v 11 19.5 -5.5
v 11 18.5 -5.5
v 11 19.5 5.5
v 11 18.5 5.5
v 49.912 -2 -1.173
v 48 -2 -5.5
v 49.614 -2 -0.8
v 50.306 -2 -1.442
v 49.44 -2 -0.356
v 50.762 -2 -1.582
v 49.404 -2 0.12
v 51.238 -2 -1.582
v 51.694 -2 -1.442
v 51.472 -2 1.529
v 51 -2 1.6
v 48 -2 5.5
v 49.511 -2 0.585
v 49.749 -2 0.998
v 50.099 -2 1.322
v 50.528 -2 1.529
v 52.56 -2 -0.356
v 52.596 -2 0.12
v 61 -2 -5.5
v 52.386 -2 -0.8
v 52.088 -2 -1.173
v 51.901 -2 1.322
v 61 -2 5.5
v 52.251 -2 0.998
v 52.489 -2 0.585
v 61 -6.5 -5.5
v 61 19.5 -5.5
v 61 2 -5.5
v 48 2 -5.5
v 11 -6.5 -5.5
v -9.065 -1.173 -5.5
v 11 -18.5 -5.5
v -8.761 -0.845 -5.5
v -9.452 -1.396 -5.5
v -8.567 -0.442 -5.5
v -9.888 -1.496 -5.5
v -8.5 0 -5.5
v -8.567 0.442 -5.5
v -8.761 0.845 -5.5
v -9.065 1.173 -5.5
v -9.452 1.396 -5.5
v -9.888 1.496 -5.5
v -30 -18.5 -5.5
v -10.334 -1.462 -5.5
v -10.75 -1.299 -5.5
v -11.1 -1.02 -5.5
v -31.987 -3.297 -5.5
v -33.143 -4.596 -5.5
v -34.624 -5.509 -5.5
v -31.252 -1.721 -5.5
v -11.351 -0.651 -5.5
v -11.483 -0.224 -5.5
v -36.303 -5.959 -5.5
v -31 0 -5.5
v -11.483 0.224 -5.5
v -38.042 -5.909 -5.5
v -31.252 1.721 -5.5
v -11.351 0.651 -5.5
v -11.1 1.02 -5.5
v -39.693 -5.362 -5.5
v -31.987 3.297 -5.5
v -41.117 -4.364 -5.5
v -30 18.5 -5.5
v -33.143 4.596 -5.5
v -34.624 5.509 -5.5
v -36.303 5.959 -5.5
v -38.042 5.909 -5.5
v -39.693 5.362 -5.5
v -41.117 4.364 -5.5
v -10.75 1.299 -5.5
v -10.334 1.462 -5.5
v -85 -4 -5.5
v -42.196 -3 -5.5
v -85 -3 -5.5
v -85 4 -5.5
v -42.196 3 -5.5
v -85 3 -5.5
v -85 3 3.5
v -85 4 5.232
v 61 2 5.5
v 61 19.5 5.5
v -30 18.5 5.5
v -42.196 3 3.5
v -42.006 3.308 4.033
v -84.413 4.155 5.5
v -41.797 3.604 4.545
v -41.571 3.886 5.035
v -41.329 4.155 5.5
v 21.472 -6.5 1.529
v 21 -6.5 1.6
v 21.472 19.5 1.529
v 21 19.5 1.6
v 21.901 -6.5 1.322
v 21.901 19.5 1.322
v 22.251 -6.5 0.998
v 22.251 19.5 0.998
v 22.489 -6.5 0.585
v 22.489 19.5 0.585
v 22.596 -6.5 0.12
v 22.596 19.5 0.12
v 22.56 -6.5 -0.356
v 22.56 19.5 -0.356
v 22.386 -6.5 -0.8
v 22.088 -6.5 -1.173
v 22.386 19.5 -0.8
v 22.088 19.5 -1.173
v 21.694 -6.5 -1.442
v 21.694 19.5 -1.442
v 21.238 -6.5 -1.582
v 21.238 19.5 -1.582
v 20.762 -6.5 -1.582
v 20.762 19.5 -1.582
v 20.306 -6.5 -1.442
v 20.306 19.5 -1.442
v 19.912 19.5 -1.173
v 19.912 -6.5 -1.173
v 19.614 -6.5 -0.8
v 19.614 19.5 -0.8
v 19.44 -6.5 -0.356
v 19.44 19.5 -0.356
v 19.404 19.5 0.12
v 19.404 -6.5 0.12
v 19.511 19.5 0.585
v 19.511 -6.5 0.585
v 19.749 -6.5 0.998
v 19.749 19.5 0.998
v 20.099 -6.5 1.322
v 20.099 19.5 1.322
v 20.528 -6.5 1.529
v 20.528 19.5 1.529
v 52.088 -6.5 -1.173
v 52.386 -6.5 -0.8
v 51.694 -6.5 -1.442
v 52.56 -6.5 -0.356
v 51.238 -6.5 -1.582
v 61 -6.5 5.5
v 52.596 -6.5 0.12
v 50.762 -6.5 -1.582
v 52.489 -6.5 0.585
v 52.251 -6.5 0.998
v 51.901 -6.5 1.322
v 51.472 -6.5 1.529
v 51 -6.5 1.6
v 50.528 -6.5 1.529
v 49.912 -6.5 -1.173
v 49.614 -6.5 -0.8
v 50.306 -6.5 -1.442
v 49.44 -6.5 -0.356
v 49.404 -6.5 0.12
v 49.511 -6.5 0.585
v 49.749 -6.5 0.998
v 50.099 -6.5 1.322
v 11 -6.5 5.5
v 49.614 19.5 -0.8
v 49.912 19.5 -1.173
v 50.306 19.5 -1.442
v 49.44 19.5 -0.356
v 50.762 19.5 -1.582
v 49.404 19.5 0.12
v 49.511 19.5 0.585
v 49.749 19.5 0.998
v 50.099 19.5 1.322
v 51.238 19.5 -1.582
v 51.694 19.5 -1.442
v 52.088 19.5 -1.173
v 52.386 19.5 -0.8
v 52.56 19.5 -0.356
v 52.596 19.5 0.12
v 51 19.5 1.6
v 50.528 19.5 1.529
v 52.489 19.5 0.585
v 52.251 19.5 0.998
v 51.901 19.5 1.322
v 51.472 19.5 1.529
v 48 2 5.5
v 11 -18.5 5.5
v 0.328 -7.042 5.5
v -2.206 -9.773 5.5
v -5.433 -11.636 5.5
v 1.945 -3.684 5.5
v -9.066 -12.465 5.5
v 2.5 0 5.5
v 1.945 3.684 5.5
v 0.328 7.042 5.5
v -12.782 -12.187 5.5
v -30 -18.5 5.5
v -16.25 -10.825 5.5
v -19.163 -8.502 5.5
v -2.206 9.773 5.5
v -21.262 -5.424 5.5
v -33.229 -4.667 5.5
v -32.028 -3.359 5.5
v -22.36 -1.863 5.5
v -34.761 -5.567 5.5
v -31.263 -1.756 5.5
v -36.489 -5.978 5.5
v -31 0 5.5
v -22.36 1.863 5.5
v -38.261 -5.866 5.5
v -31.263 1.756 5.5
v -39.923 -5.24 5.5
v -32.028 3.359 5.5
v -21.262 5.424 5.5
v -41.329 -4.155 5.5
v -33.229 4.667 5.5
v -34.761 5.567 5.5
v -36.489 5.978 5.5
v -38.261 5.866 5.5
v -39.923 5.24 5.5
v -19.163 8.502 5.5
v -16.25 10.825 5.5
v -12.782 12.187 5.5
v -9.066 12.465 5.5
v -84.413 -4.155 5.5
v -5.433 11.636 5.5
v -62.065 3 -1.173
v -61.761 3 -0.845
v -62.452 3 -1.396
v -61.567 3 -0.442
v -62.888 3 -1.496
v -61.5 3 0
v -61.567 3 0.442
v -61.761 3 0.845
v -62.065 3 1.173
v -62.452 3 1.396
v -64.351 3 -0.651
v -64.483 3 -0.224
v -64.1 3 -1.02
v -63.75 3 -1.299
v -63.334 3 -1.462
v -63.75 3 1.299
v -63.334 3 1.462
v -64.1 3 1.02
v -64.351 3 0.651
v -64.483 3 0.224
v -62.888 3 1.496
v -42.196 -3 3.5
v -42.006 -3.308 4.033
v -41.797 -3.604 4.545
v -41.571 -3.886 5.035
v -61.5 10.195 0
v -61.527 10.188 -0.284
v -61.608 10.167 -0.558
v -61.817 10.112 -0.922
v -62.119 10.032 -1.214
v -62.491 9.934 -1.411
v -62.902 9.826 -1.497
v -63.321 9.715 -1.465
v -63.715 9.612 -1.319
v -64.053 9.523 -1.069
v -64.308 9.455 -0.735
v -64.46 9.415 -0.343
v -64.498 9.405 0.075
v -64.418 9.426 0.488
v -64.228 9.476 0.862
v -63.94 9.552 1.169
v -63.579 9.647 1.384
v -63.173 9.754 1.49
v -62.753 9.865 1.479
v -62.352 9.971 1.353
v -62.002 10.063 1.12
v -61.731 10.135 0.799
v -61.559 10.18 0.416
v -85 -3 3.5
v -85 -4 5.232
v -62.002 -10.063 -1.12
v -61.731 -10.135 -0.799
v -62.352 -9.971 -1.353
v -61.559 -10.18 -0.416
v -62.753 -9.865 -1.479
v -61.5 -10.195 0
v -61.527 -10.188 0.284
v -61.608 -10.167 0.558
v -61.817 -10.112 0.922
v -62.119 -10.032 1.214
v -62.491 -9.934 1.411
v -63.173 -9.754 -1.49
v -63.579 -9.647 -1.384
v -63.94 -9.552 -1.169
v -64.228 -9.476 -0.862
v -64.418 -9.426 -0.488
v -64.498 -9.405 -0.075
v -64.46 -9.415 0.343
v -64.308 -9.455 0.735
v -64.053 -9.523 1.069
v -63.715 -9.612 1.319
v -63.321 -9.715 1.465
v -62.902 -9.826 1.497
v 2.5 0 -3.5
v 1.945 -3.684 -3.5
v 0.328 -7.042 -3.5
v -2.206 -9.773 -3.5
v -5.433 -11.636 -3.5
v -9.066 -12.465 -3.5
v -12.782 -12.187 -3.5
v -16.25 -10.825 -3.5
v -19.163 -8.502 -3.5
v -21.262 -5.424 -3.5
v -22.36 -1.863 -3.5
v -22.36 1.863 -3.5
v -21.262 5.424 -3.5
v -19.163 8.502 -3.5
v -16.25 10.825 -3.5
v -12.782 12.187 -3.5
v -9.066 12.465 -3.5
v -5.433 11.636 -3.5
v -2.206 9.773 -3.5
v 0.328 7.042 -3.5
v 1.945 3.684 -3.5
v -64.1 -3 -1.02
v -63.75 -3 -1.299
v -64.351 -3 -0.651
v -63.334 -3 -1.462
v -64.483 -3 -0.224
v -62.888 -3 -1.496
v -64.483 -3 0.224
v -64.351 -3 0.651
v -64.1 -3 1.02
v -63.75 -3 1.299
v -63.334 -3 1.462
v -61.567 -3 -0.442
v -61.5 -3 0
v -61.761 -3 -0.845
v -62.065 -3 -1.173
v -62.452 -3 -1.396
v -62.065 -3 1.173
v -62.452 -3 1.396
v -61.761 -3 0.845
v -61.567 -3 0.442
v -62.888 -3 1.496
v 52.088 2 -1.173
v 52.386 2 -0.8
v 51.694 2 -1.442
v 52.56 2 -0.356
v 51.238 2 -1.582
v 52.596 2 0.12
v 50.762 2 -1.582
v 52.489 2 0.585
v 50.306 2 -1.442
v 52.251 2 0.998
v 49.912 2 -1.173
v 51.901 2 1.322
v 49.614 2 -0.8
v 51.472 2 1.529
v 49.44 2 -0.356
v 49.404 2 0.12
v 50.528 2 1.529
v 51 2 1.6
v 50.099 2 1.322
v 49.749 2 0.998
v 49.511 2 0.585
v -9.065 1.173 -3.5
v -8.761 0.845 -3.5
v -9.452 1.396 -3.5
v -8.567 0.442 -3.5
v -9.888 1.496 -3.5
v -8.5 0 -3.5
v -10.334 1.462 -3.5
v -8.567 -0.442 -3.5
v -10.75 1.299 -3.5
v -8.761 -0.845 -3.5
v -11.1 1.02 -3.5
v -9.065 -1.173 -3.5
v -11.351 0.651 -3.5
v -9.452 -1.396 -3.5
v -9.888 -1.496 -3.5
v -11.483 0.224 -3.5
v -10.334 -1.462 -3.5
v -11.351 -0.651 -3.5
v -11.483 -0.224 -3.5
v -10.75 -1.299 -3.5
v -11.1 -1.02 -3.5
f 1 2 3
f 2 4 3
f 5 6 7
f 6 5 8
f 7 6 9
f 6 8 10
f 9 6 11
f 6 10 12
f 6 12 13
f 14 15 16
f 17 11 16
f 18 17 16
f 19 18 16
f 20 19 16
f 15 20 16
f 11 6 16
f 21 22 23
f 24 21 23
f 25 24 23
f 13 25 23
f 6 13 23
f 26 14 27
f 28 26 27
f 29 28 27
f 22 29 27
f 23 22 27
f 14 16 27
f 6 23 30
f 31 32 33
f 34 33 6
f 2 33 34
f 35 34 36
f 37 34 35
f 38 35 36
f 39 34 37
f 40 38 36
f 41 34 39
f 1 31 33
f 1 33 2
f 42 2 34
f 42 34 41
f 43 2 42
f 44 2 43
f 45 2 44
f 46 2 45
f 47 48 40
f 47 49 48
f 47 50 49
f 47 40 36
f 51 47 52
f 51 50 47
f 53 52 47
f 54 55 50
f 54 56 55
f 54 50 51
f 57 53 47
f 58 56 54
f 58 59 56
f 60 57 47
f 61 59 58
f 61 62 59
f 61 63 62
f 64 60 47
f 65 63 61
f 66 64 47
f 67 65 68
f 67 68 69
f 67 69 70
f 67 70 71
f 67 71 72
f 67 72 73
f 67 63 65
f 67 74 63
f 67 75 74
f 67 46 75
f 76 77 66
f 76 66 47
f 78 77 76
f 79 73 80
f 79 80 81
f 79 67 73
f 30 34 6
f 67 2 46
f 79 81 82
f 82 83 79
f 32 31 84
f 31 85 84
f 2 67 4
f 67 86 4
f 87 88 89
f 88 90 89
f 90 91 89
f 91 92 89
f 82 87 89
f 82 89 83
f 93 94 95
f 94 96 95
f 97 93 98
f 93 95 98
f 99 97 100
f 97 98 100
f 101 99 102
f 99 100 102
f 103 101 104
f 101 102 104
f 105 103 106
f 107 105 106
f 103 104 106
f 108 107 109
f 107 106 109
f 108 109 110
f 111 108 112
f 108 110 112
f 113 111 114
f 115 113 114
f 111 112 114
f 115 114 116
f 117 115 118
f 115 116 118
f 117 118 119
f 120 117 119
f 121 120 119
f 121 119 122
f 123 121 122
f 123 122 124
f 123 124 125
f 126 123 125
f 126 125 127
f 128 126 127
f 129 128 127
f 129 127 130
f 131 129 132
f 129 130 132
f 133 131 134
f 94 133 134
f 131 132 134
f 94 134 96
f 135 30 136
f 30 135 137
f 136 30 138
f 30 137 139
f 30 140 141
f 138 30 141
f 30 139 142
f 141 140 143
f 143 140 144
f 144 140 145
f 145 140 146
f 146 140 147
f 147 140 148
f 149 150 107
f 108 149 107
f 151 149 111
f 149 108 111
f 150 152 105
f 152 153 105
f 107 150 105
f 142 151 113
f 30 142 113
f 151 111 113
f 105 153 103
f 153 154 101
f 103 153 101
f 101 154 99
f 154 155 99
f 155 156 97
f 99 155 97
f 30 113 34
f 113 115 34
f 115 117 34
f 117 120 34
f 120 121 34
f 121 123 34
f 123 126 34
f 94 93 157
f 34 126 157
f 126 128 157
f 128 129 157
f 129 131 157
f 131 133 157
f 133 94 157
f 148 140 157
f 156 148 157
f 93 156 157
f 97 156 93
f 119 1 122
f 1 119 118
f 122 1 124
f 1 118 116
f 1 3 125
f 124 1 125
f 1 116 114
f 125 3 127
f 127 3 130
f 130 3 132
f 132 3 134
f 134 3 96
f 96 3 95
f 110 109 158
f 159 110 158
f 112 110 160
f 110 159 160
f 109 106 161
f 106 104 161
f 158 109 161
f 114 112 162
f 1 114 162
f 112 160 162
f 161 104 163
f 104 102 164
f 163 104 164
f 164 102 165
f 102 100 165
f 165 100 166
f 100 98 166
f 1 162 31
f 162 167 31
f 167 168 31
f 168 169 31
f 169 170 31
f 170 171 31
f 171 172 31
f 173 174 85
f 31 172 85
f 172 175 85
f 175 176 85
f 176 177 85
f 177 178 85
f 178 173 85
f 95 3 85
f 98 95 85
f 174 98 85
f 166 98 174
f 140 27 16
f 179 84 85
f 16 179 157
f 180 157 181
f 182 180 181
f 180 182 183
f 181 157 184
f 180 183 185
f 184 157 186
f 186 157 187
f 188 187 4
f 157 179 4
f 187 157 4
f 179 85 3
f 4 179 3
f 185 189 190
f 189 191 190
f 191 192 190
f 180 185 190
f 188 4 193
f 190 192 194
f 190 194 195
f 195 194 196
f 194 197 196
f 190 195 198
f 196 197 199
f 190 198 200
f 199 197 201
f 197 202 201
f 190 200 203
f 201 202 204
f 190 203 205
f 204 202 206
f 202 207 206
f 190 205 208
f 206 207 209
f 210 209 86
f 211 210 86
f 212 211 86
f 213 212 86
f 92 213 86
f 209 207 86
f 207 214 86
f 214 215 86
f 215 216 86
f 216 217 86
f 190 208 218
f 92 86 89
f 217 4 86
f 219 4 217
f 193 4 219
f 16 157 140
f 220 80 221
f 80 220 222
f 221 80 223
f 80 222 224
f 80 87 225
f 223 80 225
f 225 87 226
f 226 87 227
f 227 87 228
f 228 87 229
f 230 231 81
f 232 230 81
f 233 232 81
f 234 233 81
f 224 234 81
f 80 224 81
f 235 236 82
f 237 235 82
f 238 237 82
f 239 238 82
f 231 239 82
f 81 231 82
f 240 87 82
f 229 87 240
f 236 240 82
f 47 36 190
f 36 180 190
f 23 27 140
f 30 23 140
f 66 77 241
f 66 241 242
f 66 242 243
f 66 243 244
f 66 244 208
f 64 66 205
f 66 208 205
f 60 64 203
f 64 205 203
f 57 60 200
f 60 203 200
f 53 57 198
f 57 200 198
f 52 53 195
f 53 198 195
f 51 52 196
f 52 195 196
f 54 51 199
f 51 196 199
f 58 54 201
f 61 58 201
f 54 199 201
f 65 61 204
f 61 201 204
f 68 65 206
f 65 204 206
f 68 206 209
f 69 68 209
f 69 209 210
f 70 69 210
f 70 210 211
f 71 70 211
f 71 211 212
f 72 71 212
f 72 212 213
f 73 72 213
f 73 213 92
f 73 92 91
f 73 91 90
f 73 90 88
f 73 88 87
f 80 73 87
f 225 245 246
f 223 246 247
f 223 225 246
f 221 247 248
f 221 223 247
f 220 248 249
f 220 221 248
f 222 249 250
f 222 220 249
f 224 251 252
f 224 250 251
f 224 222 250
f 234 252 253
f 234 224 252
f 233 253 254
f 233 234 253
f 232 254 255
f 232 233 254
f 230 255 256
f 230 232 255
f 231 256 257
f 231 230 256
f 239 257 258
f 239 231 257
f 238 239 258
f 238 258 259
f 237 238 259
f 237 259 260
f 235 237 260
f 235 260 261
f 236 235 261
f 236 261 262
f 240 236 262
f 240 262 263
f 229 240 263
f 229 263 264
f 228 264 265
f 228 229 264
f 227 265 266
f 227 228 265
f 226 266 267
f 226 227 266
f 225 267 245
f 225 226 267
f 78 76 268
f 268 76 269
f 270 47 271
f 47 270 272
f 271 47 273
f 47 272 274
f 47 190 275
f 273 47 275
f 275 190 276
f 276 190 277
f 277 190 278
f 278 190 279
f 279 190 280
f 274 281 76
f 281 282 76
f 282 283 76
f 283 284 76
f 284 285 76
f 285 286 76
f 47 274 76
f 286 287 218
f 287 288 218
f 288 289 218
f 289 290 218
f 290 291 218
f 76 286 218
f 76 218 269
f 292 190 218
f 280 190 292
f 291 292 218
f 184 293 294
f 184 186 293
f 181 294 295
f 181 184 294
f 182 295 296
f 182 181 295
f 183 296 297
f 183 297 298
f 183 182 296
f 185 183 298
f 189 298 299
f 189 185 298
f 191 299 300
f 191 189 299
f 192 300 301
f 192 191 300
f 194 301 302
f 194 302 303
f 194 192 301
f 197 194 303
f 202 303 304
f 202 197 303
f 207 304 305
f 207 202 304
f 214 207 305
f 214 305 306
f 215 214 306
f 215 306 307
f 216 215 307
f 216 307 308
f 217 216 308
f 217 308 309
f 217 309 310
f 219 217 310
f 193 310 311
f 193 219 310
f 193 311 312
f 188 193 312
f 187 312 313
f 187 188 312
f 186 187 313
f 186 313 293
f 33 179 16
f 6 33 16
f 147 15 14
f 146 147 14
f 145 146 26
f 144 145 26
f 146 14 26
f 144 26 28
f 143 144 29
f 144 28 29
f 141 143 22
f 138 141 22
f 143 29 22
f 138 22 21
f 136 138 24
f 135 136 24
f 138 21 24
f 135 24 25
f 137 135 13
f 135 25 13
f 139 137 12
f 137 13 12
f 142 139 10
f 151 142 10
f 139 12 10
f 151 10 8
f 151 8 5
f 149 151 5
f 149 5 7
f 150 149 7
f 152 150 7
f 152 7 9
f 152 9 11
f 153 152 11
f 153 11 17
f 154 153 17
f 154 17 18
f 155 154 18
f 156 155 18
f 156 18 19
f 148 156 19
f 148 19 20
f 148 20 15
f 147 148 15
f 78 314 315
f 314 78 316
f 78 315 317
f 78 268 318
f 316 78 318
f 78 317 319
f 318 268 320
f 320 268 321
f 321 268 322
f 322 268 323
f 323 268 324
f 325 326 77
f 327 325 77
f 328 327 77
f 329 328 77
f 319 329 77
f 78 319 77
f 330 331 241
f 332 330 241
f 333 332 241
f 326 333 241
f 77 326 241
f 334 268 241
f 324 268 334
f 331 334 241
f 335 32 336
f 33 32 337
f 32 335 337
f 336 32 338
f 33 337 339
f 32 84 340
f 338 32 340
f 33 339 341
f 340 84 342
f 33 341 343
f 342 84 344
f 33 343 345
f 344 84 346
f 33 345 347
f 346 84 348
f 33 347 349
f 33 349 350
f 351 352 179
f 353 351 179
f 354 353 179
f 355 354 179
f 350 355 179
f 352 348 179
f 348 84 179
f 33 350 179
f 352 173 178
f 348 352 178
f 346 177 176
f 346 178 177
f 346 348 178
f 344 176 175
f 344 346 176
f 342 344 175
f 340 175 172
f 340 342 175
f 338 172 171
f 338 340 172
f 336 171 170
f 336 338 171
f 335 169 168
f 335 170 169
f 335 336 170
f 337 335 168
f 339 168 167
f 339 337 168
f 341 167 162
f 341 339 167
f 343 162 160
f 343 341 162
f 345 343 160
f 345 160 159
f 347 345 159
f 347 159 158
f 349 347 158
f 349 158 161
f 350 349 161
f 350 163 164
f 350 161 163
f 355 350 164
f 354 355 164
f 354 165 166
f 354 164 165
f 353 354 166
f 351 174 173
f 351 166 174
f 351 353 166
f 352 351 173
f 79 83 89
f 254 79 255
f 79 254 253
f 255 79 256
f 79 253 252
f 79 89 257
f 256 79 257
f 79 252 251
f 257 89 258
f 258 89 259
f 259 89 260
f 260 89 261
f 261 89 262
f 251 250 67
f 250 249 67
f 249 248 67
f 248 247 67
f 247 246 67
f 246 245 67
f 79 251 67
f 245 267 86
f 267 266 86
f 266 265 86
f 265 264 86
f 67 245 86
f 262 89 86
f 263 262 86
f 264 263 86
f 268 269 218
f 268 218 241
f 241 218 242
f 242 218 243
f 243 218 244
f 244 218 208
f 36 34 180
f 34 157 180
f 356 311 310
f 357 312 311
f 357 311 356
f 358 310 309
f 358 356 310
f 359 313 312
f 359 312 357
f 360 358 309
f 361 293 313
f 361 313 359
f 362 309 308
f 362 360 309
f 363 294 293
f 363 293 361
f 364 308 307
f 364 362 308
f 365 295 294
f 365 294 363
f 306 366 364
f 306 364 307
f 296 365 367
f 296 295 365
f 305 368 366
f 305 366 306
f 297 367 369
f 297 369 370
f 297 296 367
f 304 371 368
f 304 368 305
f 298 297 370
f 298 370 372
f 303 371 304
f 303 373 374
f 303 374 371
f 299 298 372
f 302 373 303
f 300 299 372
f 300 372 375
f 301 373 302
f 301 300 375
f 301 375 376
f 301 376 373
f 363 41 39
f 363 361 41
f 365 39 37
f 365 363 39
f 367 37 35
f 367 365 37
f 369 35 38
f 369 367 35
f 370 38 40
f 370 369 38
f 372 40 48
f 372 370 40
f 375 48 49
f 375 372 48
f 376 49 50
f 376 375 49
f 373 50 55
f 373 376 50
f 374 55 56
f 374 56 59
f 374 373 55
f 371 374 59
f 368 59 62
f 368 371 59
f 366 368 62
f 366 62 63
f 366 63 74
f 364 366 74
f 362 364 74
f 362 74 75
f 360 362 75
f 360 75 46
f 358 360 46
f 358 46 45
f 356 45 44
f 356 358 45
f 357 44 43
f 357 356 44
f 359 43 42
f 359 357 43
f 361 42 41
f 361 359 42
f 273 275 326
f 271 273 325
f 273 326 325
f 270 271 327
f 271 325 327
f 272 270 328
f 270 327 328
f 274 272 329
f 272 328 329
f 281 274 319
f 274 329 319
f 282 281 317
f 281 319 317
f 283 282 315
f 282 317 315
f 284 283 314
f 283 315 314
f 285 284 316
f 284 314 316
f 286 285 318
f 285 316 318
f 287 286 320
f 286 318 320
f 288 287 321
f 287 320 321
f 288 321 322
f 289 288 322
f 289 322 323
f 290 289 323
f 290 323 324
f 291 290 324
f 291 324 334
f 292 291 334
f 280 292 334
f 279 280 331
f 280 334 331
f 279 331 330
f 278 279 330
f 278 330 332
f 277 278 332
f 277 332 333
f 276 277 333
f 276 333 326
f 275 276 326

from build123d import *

# Parameters (mm, degrees)
EXTRUDE1_DEPTH          = 5.5
SKETCH2_R               = 1.6
SKETCH2_R_2             = 1.5
CUT_EXTRUDE1_DEPTH      = 20.5
CUT_EXTRUDE1_DEPTH_BACK = 19.5
CHAMFER1_SIZE           = 2
CHAMFER1_SIZE2          = 1.154700538
CHAMFER1_PART_2_SIZE    = 2
CHAMFER1_PART_2_SIZE2   = 1.154700538


with BuildPart() as part:
    # Sketch1 → Extrude1 (new body, symmetric)
    with BuildSketch(Plane.XY):
        with BuildLine():
            Line((61, -2), (61, -6.5))
            Line((61, -6.5), (11, -6.5))
            Line((11, -6.5), (11, -18.5))
            Line((11, -18.5), (-30, -18.5))
            Line((-30, -18.5), (-85, -4))
            Line((-85, -4), (-85, -3))
            Line((-85, -3), (-42.196152423, -3))
            ThreePointArc((-42.196152423, -3), (-31, 0), (-42.196152423, 3))
            Line((-42.196152423, 3), (-85, 3))
            Line((-85, 3), (-85, 4))
            Line((-85, 4), (-30, 18.5))
            Line((-30, 18.5), (11, 18.5))
            Line((11, 18.5), (11, 19.5))
            Line((11, 19.5), (61, 19.5))
            Line((61, 19.5), (61, 2))
            Line((61, 2), (48, 2))
            Line((48, 2), (48, -2))
            Line((48, -2), (61, -2))
        make_face()
    extrude(amount=EXTRUDE1_DEPTH, both=True)

    # Sketch2 → Cut-Extrude1 (cut, two sides)
    with BuildSketch(Plane(origin=(0, 0, 0), x_dir=(1, 0, 0), z_dir=(0, 1, 0))) as cut_extrude1_sk:
        with Locations(Location((21, 0, 0), (0, 0, 270))):  # turned: the seam where the file's is
            Circle(SKETCH2_R)
        with Locations(Location((51, 0, 0), (0, 0, 270))):  # turned: the seam where the file's is
            Circle(SKETCH2_R)
        with Locations((-63, 0)):
            Circle(SKETCH2_R_2)
    extrude(amount=CUT_EXTRUDE1_DEPTH, mode=Mode.SUBTRACT)
    extrude(cut_extrude1_sk.sketch, amount=-CUT_EXTRUDE1_DEPTH_BACK, mode=Mode.SUBTRACT)

    # Chamfer1
    chamfer1_edges = [part.edges().sort_by_distance(p)[0] for p in [
        (-63.598076211, -3, 5.5),
    ]]
    chamfer1_side = [part.faces().sort_by_distance(p)[0] for p in [
        (-63.598076211, -3, -5.058053242),
    ]]
    chamfer(chamfer1_edges, length=CHAMFER1_SIZE, length2=CHAMFER1_SIZE2, reference=chamfer1_side[0])

    # Chamfer1 part 2
    chamfer1_part_2_edges = [part.edges().sort_by_distance(p)[0] for p in [
        (-63.598076211, 3, 5.5),
    ]]
    chamfer1_part_2_side = [part.faces().sort_by_distance(p)[0] for p in [
        (-63.598076211, 3, -5.058053242),
    ]]
    chamfer(chamfer1_part_2_edges, length=CHAMFER1_PART_2_SIZE, length2=CHAMFER1_PART_2_SIZE2, reference=chamfer1_part_2_side[0])

    # Sketch3 → Cut-Revolve1 (revolve, cut)
    with BuildSketch(Plane(origin=(0, 0, 0), x_dir=(1, 0, 0), z_dir=(0, 1, 0))):
        Polygon((-10, 5.5), (-8.5, 5.5), (-8.5, 3.5), (2.5, 3.5), (2.5, -5.5), (-10, -5.5), align=None)
    revolve(axis=Axis((-10, 0, -5.5), (0, 0, -1)), mode=Mode.SUBTRACT)


solid = part.part
